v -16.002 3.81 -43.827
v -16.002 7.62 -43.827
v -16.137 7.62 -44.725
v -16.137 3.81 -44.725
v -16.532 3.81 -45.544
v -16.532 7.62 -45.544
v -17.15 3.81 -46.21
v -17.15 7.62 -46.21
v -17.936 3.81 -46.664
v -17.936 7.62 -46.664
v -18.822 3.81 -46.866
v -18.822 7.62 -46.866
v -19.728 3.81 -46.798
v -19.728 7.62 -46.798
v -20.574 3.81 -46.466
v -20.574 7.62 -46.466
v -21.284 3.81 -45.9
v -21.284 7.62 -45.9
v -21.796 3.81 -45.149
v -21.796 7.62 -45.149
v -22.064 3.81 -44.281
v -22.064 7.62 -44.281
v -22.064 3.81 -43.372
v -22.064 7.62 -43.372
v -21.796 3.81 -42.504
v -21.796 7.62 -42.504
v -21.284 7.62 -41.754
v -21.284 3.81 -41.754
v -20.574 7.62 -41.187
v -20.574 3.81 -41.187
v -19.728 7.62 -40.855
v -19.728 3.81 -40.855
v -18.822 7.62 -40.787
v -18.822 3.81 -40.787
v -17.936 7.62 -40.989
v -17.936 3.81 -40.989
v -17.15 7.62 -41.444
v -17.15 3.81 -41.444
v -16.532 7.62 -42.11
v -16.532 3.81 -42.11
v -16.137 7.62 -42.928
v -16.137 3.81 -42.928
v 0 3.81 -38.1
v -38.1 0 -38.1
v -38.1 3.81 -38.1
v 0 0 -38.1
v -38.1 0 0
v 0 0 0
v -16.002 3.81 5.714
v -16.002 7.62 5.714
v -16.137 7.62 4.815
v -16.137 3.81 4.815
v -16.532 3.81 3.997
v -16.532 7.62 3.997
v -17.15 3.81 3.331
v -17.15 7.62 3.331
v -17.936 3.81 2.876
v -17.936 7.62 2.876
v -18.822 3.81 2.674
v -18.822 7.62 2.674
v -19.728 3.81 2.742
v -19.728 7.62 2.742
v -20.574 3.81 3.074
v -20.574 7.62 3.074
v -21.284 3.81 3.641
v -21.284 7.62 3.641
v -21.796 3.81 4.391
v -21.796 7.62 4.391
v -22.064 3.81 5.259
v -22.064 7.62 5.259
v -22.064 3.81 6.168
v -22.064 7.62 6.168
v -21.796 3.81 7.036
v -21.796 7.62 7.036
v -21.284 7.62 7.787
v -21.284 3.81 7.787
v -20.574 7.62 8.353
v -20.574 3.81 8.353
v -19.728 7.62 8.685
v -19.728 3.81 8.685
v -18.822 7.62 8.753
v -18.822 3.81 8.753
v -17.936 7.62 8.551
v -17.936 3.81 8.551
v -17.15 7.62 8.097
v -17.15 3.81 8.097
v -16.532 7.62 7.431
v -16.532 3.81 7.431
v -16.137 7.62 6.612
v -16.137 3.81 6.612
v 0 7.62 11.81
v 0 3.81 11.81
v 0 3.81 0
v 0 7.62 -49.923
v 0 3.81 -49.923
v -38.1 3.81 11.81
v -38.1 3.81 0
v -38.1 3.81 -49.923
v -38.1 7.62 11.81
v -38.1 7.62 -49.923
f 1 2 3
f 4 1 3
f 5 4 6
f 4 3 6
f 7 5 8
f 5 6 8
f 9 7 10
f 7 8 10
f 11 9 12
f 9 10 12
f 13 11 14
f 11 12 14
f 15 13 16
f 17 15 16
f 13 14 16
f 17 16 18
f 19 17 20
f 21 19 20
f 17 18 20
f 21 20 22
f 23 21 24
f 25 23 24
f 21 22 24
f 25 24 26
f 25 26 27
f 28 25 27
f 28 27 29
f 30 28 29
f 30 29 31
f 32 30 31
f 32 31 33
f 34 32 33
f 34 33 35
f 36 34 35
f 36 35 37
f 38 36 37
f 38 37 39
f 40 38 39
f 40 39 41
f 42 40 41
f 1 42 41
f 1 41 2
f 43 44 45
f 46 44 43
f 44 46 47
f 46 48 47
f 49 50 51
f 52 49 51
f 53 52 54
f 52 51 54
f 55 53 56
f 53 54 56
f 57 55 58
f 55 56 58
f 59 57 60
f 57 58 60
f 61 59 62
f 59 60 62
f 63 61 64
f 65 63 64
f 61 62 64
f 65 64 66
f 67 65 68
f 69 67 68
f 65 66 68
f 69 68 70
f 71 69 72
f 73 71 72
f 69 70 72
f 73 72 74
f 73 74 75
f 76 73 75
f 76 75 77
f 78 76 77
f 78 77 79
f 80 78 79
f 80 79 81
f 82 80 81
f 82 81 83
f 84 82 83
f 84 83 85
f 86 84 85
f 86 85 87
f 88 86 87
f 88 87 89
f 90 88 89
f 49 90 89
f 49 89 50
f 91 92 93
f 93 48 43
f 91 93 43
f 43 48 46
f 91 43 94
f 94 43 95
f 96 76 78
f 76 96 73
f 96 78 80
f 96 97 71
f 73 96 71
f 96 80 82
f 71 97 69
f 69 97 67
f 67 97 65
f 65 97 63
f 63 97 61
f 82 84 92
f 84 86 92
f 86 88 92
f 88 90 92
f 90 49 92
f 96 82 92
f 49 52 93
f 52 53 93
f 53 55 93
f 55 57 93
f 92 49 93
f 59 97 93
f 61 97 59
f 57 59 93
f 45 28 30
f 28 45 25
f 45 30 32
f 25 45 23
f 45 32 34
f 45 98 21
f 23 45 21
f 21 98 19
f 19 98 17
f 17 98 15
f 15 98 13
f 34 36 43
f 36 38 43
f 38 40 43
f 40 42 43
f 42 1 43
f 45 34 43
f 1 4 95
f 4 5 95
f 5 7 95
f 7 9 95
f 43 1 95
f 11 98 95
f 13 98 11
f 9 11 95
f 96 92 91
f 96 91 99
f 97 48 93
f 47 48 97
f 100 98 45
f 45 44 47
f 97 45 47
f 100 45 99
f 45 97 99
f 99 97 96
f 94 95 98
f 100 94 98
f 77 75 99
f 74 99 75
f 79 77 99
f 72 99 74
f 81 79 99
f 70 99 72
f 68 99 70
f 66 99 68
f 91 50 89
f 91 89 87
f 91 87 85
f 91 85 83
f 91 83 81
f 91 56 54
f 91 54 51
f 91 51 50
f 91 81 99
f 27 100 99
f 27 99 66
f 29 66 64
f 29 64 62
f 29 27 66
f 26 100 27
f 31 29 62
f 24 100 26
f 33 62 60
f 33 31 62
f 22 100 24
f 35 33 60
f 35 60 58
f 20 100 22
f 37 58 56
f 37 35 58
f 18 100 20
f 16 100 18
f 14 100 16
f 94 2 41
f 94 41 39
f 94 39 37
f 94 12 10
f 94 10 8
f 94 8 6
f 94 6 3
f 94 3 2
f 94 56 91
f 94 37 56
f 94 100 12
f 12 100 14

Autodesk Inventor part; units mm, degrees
ref_plane "YZ Plane" through (0, 0, 0) normal (1, 0, 0) x (0, 1, 0)
ref_plane "XZ Plane" through (0, 0, 0) normal (0, 1, 0) x (-1, 0, 0)
ref_plane "XY Plane" through (0, 0, 0) normal (0, 0, 1) x (1, 0, 0)
sketch "Sketch1" plane through (0, 0, 0) normal (0, 1, 0) x (-1, 0, 0)
  line L0 (0, 0) -> (38.1, 0)
  line L1 (38.1, 0) -> (38.1, -38.1)
  line L2 (38.1, -38.1) -> (0, -38.1)
  line L3 (0, -38.1) -> (0, 0)
  dimension "d0" = 38.1
  dimension "d1" = 38.1
extrude "Extrusion1" add sketch "Sketch1" along normal blind 3.81
sketch "Sketch2" plane through (0, 3.81, 0) normal (0, 1, 0) x (1, 0, 0)
  line L0 (-38.1, 0) -> (0, 0) projected
  line L1 (0, 0) -> (0, 38.1) projected
  line L2 (0, 38.1) -> (-38.1, 38.1) projected
  line L3 (-38.1, 38.1) -> (-38.1, 0) projected
  line L4 (-38.1, 0) -> (0, 0)
  line L5 (0, 0) -> (0, -11.8097)
  line L6 (0, -11.8097) -> (-38.1, -11.8097)
  line L7 (-38.1, -11.8097) -> (-38.1, 0)
  line L8 (-38.1, 38.1) -> (0, 38.1)
  line L9 (0, 38.1) -> (0, 49.9227)
  line L10 (0, 49.9227) -> (-38.1, 49.9227)
  line L11 (-38.1, 49.9227) -> (-38.1, 38.1)
extrude "Extrusion2" add sketch "Sketch2" along normal blind 3.81
sketch "Sketch3" plane through (0, 7.62, 0) normal (0, 1, 0) x (1, 0, 0)
  line L0 (-38.1, -11.8097) -> (0, -11.8097) projected
  line L1 (-19.05, -11.8097) -> (-19.05, -5.7137)
  line L2 (0, 49.9227) -> (-38.1, 49.9227) projected
  line L3 (-19.05, 49.9227) -> (-19.05, 43.8267)
  circle A0 centre (-19.05, -5.7137) radius 3.048
  circle A1 centre (-19.05, 43.8267) radius 3.048
  point P0 (0, 0)
  dimension "d6" = 6.096
  dimension "d7" = 6.096
  dimension "d8" = 6.096
extrude "Extrusion3" cut sketch "Sketch3" against normal blind 3.81
properties part number "peltier and mount" material "Aluminum 6061-AHC"
